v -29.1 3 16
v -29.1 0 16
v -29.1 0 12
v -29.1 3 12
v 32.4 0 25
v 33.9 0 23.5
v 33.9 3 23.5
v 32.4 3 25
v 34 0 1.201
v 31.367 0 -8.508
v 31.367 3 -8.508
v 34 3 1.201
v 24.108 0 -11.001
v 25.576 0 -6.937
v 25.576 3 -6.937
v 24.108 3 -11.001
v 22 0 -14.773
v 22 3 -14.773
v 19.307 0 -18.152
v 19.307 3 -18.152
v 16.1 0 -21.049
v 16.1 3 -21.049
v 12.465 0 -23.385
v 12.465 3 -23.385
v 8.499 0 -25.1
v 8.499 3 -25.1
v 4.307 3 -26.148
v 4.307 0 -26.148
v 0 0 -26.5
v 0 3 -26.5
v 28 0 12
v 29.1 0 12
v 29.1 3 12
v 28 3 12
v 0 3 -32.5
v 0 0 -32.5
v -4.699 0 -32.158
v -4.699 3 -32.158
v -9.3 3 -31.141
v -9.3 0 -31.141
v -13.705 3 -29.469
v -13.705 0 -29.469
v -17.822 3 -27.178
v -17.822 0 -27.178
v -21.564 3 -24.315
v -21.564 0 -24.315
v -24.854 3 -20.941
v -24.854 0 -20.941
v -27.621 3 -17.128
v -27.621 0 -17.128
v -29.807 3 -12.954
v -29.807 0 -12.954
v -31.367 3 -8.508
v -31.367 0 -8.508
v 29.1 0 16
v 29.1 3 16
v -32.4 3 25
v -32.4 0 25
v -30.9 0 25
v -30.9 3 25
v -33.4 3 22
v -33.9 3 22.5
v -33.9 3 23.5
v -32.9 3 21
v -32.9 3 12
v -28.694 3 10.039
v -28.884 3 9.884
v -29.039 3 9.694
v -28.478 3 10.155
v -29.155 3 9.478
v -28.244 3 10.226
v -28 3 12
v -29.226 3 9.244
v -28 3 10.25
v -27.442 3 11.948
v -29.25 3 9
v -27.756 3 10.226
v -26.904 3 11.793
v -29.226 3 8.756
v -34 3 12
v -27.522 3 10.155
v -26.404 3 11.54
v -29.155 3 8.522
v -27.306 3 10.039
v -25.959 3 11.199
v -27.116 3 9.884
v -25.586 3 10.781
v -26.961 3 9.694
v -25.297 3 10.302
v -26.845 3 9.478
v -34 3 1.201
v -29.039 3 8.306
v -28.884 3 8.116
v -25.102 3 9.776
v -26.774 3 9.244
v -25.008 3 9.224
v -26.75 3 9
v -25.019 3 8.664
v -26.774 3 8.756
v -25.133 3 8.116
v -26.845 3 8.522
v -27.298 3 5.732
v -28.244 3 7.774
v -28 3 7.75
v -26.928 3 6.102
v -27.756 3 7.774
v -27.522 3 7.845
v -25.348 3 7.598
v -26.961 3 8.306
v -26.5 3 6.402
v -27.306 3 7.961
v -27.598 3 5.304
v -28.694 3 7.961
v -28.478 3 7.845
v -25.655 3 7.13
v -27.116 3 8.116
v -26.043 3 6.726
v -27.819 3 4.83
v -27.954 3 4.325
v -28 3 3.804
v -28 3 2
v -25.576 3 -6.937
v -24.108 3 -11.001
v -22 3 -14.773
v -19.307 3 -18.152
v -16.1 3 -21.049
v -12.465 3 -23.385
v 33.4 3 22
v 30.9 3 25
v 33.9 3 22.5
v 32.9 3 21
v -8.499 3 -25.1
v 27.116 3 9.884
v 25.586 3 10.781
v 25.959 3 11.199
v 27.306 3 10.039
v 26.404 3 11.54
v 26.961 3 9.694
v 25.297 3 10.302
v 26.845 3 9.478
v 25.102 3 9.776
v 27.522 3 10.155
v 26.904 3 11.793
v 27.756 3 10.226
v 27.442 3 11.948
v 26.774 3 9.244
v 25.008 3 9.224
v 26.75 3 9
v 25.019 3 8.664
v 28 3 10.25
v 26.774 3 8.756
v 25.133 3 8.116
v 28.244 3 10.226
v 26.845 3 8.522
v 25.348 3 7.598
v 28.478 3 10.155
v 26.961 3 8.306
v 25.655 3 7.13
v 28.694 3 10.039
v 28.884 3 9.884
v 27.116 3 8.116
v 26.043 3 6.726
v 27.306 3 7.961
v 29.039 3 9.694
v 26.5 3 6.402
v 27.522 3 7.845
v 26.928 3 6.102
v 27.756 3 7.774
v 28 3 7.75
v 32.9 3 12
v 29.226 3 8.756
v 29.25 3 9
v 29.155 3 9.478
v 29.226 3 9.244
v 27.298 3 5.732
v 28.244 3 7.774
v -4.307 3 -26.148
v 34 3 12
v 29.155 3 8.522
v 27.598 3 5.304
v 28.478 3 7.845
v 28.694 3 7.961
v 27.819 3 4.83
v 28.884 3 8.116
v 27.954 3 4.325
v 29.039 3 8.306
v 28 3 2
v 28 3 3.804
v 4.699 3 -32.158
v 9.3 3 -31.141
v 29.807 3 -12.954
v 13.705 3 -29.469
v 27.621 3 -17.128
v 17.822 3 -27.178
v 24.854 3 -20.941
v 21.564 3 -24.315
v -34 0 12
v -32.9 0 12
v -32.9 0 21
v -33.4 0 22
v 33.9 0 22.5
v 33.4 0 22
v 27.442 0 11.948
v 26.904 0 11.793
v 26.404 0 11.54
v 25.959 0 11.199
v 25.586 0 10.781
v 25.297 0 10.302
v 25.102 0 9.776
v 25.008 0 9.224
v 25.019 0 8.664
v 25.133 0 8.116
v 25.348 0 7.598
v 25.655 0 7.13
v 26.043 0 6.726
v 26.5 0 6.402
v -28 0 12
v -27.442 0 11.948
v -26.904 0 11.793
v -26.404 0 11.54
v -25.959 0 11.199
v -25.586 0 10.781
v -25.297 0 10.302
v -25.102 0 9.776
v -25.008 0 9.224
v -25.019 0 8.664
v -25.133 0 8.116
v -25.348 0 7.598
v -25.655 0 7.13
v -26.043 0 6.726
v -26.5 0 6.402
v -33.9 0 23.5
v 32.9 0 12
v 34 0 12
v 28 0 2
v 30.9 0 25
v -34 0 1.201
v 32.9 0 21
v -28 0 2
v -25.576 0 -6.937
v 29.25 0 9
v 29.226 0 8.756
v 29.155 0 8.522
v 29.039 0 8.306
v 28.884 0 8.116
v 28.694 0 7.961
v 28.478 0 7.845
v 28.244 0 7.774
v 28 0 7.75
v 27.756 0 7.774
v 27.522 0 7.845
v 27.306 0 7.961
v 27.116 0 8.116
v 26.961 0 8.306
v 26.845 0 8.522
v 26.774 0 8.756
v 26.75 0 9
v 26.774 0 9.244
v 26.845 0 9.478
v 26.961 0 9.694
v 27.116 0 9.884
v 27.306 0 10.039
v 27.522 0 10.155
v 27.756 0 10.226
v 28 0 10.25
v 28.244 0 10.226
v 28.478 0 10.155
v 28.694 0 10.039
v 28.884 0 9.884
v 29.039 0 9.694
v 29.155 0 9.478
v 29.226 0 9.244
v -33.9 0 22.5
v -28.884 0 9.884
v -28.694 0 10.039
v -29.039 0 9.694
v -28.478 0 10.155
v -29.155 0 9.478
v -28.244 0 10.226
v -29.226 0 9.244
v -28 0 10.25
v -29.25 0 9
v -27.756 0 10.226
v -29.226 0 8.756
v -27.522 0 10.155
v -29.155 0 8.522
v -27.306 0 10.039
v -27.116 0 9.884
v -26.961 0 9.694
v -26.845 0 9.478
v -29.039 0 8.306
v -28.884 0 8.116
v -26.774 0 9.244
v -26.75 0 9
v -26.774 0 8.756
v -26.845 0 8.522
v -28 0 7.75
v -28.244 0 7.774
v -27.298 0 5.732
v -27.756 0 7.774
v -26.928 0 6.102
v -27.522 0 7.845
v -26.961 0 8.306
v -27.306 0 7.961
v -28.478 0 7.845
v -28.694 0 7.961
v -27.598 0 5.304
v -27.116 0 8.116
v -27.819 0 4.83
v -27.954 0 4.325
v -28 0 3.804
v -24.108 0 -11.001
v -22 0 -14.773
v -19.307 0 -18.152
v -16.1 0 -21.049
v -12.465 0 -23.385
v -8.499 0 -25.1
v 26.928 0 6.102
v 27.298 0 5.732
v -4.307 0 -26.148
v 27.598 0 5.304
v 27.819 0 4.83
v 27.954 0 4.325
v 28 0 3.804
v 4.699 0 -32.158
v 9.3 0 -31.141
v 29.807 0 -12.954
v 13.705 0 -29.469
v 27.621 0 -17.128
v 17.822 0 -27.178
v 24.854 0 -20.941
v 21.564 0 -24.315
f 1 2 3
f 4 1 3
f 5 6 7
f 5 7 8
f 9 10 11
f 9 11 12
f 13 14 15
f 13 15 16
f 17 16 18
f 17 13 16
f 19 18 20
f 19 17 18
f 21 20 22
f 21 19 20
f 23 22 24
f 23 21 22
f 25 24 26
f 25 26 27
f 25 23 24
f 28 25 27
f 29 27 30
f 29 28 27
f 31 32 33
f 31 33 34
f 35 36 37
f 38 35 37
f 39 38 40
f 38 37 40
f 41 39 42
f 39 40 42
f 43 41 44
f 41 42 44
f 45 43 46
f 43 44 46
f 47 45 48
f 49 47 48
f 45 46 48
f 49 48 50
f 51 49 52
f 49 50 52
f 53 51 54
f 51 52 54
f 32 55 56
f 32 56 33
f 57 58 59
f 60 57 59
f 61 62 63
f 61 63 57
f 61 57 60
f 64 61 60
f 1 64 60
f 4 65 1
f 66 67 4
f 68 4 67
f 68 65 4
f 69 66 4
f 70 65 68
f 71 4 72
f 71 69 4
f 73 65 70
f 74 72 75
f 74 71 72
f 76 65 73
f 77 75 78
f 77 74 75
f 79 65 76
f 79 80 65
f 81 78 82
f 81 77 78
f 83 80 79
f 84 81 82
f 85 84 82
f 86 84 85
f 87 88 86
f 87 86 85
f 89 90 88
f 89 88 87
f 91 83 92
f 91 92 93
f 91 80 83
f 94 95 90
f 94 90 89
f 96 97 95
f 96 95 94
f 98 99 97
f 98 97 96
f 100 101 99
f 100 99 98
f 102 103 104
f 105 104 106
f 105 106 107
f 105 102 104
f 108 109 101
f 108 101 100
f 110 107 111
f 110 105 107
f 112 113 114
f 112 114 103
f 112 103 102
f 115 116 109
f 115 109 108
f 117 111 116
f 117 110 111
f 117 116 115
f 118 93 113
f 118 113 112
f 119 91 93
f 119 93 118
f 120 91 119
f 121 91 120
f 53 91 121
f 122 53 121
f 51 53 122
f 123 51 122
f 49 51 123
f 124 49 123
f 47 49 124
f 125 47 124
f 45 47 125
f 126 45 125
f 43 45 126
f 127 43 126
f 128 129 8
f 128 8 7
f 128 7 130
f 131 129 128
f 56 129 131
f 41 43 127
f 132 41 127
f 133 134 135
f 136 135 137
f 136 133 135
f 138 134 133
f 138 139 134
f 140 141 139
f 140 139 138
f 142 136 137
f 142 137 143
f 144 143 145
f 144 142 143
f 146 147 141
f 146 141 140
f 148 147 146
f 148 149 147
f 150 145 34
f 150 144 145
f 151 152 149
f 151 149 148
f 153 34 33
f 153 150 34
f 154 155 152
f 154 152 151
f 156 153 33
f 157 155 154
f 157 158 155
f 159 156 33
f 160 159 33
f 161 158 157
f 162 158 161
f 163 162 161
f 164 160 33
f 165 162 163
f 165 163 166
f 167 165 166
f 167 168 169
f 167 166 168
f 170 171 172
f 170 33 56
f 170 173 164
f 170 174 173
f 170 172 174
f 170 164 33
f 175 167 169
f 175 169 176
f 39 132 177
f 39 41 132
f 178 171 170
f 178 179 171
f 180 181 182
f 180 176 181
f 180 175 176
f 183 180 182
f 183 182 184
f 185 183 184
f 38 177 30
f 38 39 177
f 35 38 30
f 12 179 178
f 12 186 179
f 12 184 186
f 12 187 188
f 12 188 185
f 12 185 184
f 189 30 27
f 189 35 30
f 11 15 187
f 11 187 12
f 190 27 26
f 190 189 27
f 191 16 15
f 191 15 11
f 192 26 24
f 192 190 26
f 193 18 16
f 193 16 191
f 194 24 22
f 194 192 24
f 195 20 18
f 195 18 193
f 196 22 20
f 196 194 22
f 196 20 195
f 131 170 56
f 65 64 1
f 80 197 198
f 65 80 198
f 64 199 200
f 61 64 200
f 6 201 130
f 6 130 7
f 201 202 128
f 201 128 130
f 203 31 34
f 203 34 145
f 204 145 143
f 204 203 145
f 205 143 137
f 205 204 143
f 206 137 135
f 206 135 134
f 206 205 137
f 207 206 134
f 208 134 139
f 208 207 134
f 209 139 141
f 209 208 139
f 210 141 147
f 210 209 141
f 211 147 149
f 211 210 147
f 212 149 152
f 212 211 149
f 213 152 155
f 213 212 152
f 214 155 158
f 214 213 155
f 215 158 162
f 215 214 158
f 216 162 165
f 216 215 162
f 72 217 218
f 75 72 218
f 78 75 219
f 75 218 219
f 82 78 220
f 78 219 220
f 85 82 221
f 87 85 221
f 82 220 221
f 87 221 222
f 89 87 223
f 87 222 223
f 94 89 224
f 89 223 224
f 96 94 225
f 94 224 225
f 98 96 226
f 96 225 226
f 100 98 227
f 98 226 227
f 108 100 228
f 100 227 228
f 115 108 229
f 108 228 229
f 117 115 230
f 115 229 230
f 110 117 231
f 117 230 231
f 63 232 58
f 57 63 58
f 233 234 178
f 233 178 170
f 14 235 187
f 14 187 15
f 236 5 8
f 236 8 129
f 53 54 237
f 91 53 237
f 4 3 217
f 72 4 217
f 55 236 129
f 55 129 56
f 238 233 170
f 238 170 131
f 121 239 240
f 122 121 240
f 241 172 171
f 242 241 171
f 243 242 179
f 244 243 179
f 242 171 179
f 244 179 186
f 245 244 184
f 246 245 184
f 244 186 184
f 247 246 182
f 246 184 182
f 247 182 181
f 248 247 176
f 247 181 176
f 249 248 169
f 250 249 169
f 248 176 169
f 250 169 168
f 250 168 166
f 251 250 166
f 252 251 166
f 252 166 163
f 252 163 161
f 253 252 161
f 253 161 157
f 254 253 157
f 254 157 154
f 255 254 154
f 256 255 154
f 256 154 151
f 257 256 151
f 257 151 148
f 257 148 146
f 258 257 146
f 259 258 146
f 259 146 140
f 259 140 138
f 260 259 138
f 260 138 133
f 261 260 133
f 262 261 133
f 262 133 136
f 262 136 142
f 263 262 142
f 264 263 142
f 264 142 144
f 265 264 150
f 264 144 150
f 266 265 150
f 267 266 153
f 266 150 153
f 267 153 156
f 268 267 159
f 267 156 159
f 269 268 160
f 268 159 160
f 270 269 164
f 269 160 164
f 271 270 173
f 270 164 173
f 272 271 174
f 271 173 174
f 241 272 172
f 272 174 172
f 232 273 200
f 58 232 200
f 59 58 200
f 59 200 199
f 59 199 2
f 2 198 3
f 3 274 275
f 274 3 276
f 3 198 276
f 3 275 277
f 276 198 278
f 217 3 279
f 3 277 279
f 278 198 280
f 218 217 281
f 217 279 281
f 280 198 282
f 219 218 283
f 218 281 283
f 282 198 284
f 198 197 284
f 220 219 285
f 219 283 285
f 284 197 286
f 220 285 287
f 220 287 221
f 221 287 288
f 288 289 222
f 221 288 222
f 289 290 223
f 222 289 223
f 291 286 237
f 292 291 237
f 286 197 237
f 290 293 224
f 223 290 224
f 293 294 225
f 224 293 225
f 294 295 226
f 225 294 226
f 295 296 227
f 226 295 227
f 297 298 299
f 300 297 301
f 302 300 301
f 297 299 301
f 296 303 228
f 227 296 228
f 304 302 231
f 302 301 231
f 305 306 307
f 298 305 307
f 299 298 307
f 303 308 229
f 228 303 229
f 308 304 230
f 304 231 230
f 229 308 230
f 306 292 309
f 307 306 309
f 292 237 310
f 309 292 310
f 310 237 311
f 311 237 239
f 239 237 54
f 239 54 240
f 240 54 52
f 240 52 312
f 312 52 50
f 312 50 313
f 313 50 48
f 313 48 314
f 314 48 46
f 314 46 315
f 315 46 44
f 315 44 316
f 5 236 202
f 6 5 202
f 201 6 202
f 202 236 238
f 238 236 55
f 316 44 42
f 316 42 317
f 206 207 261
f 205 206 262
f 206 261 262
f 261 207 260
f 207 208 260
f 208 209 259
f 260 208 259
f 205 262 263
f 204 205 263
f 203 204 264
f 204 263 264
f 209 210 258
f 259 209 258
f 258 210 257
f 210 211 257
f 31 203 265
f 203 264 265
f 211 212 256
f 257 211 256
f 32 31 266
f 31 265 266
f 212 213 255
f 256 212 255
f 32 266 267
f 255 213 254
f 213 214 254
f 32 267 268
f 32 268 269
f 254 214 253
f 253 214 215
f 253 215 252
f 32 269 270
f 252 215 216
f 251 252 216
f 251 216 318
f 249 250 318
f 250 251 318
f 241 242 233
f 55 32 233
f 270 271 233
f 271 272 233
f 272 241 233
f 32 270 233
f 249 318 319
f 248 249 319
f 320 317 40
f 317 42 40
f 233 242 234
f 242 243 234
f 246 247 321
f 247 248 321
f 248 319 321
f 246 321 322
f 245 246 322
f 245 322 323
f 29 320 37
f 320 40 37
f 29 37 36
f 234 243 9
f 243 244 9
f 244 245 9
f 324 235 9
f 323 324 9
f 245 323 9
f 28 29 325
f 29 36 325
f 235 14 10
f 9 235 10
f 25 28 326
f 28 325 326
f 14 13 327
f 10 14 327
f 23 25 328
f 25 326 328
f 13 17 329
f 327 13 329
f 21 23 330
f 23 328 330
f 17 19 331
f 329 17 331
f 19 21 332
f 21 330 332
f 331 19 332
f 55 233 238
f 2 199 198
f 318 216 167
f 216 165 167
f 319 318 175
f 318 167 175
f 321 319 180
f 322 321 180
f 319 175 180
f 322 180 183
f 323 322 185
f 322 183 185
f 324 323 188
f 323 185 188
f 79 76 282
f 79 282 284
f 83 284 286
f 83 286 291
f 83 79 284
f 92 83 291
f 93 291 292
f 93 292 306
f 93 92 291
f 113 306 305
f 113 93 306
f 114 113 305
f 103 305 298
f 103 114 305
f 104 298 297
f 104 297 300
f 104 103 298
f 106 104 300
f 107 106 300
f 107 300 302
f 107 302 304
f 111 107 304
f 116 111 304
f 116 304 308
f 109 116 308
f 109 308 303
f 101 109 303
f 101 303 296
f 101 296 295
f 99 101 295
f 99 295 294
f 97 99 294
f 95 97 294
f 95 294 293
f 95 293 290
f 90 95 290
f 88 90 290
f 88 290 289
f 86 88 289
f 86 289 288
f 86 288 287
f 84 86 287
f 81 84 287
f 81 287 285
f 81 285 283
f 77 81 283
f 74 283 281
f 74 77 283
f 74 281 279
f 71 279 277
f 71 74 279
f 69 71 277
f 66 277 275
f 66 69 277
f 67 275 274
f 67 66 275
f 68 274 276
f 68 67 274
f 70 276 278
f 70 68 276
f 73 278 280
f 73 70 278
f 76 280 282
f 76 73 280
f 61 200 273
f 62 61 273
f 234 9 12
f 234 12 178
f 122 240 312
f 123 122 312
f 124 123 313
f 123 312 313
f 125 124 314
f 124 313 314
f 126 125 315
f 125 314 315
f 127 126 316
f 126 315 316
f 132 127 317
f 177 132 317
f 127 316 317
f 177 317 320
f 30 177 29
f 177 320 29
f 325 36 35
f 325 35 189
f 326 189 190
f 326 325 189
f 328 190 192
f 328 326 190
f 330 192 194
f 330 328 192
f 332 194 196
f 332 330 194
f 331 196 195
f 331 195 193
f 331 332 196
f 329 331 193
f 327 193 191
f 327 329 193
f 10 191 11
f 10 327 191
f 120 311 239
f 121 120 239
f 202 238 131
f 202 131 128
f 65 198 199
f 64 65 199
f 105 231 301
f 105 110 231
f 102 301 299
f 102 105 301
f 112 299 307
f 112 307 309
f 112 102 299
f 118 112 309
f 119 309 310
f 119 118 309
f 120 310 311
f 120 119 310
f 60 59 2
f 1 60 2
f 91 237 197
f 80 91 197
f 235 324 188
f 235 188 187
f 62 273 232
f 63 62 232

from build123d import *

# Parameters (mm, degrees)
BOSS_EXTRUDE1_DEPTH = 3
BOSS_EXTRUDE2_DEPTH = 3
FILLET1_R           = 3
SKETCH4_R           = 1.25
CUT_EXTRUDE1_DEPTH  = 4


with BuildPart() as part:
    # Sketch1 → Boss-Extrude1 (new body)
    with BuildSketch(Plane(origin=(0, 0, 0), x_dir=(1, 0, 0), z_dir=(0, 1, 0))):
        with BuildLine():
            Line((29.1, -16), (29.1, -12))
            Line((29.1, -12), (28, -12))
            Line((28, -12), (28, -2))
            Line((28, -2), (25.57587166, 6.937203242))
            ThreePointArc((25.57587166, 6.937203242), (16.099908604, 21.048585296), (0, 26.5))
            Line((0, 26.5), (0, 32.5))
            ThreePointArc((0, 32.5), (19.745170929, 25.814302721), (31.366635055, 8.507890769))
            Line((31.366635055, 8.507890769), (34, -1.200719678))
            Line((34, -1.200719678), (34, -12))
            Line((34, -12), (32.9, -12))
            Line((32.9, -12), (32.9, -21))
            Line((32.9, -21), (33.4, -22))
            Line((33.4, -22), (33.9, -22.5))
            Line((33.9, -22.5), (33.9, -23.5))
            Line((33.9, -23.5), (32.4, -25))
            Line((32.4, -25), (30.9, -25))
            Line((30.9, -25), (29.1, -16))
        make_face()
    extrude(amount=BOSS_EXTRUDE1_DEPTH)

    # Sketch3 → Boss-Extrude2 (add)
    with BuildSketch(Plane(origin=(0, 0, 0), x_dir=(1, 0, 0), z_dir=(0, 1, 0))):
        with BuildLine():
            Line((28, -6), (28, -12))
            ThreePointArc((28, -12), (25, -9), (28, -6))
        make_face()
    extrude(amount=BOSS_EXTRUDE2_DEPTH)

    # Fillet1
    fillet1_edges = [part.edges().sort_by_distance(p)[0] for p in [
        (28, 1.5, 6),
    ]]
    fillet(fillet1_edges, radius=FILLET1_R)

    # Sketch4 → Cut-Extrude1 (cut, through all)
    with BuildSketch(Plane(origin=(0, 3, 0), x_dir=(1, 0, 0), z_dir=(0, 1, 0))):
        with Locations((28, -9)):
            Circle(SKETCH4_R)
    extrude(amount=-CUT_EXTRUDE1_DEPTH, mode=Mode.SUBTRACT)

    # Mirror1: part across plane


with BuildPart() as part_1:
    add(part.part)
    add(part.part.mirror(Plane(origin=(0, 0, 0), x_dir=(0, 0, 1), z_dir=(1, 0, 0))))


solid = part_1.part
